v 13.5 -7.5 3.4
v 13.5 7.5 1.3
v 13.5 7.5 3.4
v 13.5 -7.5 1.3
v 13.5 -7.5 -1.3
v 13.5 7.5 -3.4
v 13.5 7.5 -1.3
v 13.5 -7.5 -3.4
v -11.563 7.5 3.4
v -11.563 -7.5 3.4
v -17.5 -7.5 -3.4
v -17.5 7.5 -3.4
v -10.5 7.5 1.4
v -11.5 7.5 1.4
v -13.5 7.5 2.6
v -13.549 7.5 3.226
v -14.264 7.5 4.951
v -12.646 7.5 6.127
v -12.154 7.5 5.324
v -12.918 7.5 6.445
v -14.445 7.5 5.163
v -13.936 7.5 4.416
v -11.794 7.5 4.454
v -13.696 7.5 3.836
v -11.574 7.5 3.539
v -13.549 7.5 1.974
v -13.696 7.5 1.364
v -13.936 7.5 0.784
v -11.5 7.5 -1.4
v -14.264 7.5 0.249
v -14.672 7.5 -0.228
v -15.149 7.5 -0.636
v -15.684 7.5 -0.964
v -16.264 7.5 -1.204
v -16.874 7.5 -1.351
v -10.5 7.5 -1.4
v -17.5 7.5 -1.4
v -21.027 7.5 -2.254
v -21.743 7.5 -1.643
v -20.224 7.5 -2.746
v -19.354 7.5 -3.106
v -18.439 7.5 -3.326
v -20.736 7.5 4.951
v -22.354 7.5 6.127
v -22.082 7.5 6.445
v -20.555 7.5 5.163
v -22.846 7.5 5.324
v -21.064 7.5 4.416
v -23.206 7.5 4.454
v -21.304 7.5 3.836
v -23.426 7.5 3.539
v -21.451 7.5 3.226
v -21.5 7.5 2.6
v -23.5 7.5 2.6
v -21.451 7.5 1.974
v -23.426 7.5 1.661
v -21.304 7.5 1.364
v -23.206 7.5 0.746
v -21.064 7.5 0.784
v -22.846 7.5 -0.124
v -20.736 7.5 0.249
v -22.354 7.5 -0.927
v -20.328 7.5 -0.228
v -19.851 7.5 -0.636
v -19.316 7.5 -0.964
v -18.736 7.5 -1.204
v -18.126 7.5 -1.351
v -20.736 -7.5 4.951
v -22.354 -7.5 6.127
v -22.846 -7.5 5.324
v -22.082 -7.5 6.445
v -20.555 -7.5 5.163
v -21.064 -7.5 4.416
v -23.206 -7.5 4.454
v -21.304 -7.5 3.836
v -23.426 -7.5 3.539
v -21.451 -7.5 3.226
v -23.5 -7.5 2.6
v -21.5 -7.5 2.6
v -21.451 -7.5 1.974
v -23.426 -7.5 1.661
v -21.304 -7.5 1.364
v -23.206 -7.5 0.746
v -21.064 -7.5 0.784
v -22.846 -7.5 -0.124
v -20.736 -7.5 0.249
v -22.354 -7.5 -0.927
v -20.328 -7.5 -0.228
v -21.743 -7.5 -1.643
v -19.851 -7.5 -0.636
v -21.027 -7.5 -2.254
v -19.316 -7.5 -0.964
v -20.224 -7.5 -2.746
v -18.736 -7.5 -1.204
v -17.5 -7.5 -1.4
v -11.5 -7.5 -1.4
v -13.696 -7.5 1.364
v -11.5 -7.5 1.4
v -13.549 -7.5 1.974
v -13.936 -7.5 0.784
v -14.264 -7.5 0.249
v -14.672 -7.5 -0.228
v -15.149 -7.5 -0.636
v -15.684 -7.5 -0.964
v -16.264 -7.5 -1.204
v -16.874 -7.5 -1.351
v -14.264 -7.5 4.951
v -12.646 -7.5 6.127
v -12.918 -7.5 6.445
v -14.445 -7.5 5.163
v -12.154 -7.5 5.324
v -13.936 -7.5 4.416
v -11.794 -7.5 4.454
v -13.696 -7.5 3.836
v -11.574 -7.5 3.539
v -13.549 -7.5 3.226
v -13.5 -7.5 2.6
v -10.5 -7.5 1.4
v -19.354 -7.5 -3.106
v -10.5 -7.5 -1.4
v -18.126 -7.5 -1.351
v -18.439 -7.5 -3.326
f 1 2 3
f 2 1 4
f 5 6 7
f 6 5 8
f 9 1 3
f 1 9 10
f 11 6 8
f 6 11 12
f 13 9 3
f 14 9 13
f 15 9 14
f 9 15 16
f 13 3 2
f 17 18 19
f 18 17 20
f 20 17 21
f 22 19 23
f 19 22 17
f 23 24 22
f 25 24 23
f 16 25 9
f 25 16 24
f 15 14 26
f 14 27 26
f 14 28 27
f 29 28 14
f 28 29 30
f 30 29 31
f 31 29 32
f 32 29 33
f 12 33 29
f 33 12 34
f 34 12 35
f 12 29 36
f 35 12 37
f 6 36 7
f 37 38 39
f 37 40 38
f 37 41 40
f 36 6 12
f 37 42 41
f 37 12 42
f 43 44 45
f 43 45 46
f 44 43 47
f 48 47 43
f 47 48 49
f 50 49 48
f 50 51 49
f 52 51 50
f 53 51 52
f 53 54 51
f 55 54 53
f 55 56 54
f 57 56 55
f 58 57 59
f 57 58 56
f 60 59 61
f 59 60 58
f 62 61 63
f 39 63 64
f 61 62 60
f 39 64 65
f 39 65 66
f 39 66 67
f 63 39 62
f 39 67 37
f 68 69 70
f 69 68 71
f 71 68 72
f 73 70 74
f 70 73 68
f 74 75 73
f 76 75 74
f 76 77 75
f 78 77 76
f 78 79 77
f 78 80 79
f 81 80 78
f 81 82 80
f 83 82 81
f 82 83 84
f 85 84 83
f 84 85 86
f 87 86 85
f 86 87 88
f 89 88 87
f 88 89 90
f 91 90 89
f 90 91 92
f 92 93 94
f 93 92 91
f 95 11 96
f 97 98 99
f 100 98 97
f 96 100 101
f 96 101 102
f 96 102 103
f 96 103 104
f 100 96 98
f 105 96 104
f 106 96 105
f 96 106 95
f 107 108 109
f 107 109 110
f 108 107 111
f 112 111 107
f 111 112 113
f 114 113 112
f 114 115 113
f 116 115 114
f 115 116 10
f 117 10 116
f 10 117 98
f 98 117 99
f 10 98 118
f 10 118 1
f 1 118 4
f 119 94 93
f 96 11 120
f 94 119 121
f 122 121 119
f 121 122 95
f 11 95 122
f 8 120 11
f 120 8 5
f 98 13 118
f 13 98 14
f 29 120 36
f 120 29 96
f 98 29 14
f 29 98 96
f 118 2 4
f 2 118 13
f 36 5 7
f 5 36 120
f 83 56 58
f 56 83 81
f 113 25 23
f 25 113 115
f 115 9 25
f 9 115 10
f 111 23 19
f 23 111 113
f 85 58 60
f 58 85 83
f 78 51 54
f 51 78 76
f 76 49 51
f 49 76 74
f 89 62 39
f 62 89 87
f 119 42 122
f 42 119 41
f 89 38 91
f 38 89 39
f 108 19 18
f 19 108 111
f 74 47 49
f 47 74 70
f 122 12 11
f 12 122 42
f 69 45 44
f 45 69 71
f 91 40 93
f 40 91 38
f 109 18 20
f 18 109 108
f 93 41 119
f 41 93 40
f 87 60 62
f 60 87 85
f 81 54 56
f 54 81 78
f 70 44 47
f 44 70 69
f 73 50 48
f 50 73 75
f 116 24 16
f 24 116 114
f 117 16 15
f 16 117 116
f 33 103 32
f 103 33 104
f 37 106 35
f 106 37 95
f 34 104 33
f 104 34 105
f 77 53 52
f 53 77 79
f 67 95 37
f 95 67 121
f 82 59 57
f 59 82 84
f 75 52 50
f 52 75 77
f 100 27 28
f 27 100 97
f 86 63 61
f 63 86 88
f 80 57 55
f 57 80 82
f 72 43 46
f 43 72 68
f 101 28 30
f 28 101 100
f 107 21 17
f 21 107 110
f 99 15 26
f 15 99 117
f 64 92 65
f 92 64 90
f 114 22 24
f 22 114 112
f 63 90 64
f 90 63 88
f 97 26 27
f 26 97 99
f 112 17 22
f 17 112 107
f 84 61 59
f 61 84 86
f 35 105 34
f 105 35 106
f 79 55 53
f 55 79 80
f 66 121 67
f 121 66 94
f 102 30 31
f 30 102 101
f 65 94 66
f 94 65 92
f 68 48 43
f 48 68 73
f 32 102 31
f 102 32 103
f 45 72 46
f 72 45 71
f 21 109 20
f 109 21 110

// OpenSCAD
//Journal Pen Holder
//by Khairulmizam Samsudin, Sept 2016
//xource@gmail.com
//"journal_pen_holder" is licenced under Creative Commons :
//Attribution-NonCommercial-ShareAlike 4.0 International (CC BY-NC-SA 4.0)
//http://creativecommons.org/licenses/by-nc-sa/4.0/

//UPDATES:
//21/9/2016 - Released
//22/9/2016 - Updates
//- Code cleanup
//- Added print option
//24/9/2016 - bug fix, small gap between cover and pen clip

/* [Options] */
// preview[view:south, tilt:side]
// Journal cover thickness.   
Cover_thickness=2.8; // [1:5]
// Diameter of the pen.
Pen_diameter=8; // [5:20]
// Width of the holder.
Holder_width=15; // [10:30]
// Increase thickness at the tip of the clip to improve retention.
Retention_factor=0.2;
// Position for printing.
Print=0; // [0:No, 1:Yes]

/* [Hidden] */
coverT=Cover_thickness;
clipT=2;
clipL=25;
clipW=Holder_width;
clipH=clipT*2+coverT;
penD=Pen_diameter;
penR=penD/2;
apex=Retention_factor;
print=Print;

epsilon=0.1;
$fn=40;

module ocylinder(R1,R2,H) {
    difference() {
        cylinder(r=R1,h=H,center=true);
        cylinder(r=R2,h=H+epsilon,center=true);
    }
}

module cover(L=clipL*2,e=0,apex=0) {
    //%cube([L+e,clipW*4,coverT],center=true);
    hull() {
        translate([1/2-L/2,0,0]) cube([1,clipW*4,coverT],center=true);
        translate([-1/2+L/2+e,0,0]) cube([1,clipW*4,coverT-apex],center=true);
    }
}



module holder() {
    //journal clip
    difference() {
        cube([clipL+clipT,clipW,clipH],center=true);
        translate([clipT/2,0,0]) cover(L=clipL,e=epsilon,apex=apex);
    }
    translate([-clipT/2-penR,0,-clipT/2-coverT/2]) cube([clipL,clipW,clipT],center=true);
    
    //pen clip
    holderAngle=260;
    holderR1=penR+clipT;
    translate([-holderR1-(clipL-clipT)/2,0,holderR1-clipH/2]) rotate([90,0,0]) difference() {
        ocylinder(holderR1,penR,clipW);
        hull() {
            rotate([0,0,180-holderAngle/2]) translate([2,holderR1,0]) cube([4,holderR1*2,clipW+epsilon],center=true);
        rotate([0,0,180+holderAngle/2]) translate([-2,holderR1,0]) cube([4,holderR1*2,clipW+epsilon],center=true);
        }
    }
}

rotX = print?90:0;
 rotate([rotX,0,0]) union() {
    %translate([clipT/2+clipL/2,0,0]) cover();
    holder();
}
